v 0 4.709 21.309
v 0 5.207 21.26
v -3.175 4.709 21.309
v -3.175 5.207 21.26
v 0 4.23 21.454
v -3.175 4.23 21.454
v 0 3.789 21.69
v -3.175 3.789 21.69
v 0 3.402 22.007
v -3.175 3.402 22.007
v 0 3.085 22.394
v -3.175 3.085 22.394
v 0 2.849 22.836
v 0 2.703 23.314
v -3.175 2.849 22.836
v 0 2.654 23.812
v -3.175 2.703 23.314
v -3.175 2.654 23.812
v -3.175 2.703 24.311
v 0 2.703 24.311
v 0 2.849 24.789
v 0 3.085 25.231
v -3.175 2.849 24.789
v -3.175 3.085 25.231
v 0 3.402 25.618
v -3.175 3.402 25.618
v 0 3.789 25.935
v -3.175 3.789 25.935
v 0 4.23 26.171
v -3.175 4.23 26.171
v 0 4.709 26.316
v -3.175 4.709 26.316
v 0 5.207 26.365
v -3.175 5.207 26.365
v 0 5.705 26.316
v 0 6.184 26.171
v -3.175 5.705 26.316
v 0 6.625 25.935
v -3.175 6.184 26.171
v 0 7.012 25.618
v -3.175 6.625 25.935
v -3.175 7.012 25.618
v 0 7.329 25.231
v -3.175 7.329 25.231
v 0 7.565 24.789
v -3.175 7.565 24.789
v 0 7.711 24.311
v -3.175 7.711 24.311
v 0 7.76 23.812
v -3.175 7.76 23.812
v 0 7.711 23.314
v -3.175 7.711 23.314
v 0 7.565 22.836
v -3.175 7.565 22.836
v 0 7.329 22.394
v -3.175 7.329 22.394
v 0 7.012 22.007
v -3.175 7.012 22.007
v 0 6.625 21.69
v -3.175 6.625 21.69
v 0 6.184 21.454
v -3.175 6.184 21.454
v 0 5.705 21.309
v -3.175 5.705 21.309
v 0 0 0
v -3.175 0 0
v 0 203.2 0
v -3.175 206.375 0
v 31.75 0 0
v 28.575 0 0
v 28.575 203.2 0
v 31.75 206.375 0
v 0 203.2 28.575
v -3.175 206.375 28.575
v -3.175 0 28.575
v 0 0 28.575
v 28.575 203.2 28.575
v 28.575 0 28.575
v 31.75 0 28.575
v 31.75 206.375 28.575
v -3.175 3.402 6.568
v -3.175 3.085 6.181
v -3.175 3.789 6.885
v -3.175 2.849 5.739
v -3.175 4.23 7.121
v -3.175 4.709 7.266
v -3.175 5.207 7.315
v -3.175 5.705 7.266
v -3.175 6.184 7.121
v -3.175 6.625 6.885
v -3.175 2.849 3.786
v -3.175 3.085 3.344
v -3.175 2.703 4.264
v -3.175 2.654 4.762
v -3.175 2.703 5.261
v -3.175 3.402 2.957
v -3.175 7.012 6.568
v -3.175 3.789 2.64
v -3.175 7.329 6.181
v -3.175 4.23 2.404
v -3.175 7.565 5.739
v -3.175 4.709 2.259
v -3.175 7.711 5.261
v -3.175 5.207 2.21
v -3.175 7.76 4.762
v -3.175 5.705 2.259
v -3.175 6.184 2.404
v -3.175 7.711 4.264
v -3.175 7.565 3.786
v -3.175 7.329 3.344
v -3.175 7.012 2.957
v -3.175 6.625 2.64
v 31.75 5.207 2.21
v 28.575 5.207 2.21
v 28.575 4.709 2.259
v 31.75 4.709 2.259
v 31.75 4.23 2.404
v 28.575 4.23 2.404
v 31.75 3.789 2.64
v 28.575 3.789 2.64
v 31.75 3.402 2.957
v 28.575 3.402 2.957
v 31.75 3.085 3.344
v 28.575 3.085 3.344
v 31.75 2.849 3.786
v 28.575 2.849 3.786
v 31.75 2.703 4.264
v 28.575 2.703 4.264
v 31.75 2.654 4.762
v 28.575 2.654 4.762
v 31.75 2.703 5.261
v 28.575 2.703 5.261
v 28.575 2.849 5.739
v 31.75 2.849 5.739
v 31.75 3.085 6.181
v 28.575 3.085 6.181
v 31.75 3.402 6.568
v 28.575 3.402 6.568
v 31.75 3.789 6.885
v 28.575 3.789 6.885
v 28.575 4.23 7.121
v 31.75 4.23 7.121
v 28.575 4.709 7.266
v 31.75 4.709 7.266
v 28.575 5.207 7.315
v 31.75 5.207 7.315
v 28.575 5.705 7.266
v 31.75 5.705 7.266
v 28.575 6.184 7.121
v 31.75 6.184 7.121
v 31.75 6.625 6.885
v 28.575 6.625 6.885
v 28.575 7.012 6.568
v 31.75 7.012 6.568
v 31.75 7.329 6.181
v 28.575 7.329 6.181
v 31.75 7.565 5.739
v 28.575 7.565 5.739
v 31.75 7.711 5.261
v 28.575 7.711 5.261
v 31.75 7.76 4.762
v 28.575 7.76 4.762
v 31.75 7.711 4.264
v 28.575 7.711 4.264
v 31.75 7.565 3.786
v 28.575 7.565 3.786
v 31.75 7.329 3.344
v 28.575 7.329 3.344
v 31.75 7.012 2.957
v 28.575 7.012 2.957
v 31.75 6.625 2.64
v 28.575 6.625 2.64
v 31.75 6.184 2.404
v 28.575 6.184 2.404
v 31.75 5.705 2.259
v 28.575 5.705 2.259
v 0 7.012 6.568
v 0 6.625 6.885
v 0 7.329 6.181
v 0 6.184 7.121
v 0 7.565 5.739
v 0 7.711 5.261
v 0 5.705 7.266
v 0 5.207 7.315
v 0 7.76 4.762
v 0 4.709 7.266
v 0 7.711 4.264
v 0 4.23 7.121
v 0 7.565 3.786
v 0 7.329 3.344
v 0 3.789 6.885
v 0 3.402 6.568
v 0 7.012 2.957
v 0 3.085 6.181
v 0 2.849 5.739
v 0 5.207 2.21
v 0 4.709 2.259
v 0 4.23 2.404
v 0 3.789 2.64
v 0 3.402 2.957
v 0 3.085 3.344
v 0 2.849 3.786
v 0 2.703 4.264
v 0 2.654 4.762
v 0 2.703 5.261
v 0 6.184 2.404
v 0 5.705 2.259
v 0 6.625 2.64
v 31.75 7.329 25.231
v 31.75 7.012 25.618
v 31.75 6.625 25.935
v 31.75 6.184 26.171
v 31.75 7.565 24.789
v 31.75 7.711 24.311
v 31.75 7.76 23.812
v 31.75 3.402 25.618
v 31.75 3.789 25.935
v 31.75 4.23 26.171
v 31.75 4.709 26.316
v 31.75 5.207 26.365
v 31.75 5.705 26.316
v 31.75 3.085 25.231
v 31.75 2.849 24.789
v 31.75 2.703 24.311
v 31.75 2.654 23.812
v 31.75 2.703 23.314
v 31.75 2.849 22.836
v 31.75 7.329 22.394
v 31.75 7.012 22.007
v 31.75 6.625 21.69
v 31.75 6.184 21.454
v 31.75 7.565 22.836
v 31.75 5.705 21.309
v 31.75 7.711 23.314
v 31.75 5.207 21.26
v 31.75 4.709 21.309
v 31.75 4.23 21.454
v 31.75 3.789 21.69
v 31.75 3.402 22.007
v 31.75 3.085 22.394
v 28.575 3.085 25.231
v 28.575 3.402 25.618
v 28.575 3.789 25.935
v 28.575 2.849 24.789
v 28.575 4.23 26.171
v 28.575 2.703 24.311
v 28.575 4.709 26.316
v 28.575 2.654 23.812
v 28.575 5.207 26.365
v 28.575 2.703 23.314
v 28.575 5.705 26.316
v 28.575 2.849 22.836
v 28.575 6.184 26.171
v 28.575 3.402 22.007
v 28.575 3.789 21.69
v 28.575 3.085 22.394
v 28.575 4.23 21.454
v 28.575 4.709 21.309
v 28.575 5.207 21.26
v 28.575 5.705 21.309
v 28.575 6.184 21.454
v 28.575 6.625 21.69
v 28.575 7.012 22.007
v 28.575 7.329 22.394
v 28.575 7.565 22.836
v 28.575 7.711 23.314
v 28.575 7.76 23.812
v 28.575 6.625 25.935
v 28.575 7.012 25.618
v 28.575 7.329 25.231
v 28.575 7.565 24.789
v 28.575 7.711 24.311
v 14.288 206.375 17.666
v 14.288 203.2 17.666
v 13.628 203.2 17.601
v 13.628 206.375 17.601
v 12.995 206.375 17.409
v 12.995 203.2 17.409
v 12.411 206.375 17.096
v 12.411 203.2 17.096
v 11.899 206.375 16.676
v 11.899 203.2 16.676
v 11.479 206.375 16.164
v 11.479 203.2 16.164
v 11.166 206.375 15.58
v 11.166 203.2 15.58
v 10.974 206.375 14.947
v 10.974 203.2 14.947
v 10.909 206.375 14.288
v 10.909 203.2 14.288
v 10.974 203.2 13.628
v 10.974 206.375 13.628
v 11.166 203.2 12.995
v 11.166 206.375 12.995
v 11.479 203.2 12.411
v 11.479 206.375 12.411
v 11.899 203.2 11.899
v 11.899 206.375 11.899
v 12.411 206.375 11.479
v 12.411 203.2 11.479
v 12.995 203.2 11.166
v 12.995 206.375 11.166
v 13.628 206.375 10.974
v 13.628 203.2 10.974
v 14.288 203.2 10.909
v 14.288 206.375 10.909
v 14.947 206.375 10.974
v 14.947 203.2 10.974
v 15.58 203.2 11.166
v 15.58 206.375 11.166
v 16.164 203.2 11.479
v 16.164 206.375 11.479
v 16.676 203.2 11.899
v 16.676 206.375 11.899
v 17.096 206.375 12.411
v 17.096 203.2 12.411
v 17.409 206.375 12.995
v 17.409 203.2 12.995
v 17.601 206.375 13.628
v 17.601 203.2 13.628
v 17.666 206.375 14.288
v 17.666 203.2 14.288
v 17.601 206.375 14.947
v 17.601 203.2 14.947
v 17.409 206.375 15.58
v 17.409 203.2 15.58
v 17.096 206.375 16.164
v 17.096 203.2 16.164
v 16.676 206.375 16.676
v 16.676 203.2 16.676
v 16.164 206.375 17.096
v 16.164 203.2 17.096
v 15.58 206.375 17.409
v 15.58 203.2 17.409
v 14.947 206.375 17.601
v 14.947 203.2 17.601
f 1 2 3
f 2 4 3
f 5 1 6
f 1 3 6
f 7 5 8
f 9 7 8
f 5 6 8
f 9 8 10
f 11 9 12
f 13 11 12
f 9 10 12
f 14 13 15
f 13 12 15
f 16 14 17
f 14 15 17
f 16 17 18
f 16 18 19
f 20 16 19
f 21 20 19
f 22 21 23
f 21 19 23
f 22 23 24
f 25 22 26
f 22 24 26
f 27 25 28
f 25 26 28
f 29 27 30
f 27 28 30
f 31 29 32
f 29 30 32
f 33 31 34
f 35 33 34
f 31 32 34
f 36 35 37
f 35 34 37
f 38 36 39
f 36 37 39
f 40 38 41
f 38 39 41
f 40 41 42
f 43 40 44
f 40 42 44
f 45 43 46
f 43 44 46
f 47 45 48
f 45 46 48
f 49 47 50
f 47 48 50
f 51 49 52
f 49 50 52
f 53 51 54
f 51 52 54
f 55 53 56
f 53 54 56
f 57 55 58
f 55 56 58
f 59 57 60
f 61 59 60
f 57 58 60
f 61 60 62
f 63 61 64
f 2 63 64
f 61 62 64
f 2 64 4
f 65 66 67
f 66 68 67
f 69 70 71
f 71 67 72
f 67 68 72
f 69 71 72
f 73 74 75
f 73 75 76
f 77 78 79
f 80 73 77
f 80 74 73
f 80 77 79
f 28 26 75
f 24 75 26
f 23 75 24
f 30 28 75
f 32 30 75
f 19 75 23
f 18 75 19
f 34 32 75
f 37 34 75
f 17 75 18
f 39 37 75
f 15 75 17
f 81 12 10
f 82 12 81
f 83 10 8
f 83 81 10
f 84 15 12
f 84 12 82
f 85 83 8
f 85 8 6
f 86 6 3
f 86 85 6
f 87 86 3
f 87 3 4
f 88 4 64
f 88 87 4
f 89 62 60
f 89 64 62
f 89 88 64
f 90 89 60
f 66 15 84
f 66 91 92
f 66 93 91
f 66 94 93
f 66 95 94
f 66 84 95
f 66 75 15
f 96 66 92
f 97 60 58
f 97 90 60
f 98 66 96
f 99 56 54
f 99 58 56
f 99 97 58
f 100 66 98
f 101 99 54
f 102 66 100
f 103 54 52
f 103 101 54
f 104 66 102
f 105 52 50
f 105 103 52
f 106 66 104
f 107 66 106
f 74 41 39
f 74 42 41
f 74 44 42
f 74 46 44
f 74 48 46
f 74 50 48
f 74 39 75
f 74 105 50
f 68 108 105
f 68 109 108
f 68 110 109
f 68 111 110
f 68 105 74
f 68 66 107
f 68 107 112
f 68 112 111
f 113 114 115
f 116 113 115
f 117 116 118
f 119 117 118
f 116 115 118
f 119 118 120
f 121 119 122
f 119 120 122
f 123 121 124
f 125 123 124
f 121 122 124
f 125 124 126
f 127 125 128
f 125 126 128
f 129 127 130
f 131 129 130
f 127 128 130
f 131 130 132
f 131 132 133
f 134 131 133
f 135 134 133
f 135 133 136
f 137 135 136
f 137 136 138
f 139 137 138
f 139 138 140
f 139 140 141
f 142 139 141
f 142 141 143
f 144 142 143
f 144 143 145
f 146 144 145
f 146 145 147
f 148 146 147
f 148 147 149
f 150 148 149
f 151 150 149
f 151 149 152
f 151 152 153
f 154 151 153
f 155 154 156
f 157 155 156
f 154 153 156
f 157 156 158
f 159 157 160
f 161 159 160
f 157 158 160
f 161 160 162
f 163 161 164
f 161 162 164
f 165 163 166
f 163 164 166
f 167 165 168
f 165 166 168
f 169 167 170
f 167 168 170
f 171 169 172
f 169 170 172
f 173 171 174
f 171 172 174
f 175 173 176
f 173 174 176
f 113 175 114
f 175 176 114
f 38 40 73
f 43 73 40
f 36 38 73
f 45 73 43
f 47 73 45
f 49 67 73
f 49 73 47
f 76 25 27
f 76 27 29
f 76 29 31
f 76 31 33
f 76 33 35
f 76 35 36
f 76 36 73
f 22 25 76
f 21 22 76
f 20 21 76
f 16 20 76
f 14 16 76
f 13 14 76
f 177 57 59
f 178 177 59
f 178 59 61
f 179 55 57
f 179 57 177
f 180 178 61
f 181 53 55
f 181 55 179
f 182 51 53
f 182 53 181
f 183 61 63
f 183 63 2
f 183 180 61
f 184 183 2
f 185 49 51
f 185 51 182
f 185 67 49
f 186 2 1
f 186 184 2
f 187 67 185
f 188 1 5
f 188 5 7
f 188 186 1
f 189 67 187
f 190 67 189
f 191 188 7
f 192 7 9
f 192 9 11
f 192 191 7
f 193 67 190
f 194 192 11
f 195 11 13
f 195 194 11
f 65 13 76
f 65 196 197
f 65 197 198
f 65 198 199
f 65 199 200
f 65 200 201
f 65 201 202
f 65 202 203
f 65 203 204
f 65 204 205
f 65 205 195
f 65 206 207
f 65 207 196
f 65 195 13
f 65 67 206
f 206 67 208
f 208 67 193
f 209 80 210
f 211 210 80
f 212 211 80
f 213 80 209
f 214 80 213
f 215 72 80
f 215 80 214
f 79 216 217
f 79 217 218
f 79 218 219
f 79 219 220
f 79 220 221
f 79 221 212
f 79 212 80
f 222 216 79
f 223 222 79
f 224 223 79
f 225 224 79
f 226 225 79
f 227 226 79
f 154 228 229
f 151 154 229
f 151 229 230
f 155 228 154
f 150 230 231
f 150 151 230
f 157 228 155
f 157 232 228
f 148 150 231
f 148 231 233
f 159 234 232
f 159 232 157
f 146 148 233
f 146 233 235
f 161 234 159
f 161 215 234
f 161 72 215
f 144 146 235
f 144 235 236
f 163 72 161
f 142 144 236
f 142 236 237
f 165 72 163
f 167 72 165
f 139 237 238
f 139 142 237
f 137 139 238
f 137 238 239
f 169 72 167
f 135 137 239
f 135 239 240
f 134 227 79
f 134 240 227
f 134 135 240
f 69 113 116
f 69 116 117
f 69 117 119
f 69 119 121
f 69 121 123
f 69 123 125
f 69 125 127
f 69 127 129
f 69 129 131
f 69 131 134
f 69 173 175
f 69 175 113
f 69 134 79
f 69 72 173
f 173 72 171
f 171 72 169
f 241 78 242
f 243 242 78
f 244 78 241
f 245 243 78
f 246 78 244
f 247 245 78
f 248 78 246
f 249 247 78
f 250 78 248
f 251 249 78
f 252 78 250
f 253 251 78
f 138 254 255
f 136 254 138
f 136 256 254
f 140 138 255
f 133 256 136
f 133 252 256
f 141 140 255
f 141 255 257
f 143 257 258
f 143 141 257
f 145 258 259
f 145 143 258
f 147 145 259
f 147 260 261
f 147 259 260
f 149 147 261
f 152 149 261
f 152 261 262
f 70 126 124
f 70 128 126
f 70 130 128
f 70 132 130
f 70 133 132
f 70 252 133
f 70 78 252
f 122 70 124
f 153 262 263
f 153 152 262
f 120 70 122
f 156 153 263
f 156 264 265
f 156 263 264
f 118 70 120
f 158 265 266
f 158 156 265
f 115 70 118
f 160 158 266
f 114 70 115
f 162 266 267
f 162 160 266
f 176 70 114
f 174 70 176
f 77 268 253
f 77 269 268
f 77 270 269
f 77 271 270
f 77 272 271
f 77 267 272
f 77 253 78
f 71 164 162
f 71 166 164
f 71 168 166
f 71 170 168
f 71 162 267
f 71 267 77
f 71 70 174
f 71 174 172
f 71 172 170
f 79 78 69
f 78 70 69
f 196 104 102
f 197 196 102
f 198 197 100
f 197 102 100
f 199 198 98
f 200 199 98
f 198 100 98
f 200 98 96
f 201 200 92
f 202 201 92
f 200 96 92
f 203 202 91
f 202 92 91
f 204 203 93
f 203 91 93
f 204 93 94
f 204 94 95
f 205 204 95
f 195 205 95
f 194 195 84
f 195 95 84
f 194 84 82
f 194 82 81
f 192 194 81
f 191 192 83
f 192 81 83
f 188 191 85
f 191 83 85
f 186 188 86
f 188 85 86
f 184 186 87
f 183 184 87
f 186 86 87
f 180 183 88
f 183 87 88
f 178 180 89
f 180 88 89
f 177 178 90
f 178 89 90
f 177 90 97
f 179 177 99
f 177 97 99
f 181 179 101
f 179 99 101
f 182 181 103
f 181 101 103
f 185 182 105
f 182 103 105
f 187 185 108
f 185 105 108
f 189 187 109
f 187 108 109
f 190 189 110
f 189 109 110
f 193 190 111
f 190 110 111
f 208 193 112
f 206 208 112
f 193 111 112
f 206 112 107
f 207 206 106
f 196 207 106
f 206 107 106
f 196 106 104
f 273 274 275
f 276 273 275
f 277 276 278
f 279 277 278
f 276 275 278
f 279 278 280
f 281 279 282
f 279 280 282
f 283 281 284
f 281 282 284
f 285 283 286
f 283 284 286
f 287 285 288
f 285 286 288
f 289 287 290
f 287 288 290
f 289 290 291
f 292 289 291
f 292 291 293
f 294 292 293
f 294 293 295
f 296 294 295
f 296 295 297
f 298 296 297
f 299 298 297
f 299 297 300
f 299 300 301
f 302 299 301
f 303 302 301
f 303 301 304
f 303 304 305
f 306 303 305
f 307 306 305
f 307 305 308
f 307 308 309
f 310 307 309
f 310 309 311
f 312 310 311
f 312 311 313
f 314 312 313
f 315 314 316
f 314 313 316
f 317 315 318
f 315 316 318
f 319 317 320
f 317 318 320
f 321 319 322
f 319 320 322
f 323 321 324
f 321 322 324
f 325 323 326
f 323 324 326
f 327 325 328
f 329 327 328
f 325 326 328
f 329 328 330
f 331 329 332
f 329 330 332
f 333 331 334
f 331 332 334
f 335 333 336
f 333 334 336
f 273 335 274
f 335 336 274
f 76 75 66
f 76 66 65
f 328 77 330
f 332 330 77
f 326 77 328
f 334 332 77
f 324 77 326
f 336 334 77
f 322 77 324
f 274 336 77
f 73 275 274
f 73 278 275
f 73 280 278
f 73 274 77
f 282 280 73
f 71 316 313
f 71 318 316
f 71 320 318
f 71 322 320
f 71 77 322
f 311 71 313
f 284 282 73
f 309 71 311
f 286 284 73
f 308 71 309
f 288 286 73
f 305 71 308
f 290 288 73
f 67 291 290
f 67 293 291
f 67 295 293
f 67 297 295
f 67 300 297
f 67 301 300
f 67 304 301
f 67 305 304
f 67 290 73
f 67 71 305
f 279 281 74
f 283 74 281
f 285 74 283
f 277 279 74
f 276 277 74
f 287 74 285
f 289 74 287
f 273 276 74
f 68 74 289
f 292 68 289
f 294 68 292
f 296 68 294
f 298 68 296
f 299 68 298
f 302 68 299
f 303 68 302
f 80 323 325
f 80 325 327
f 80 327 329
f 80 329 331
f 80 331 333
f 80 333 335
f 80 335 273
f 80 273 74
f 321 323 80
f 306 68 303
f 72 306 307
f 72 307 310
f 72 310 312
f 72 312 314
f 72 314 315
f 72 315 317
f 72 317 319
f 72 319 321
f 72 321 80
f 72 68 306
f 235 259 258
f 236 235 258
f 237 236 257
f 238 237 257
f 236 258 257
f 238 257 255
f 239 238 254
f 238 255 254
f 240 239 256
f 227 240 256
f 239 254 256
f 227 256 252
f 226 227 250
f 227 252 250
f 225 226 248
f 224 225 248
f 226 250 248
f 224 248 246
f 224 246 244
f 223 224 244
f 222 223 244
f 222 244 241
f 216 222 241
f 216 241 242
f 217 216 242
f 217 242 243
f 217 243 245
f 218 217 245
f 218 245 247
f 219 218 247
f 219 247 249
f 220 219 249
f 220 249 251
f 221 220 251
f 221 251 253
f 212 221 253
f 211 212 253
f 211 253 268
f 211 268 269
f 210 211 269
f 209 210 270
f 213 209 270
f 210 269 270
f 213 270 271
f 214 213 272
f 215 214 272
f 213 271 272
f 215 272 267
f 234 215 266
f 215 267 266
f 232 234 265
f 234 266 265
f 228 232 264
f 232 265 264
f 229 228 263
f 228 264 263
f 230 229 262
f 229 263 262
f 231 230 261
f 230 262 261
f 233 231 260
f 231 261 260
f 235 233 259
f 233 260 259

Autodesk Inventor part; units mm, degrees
ref_plane "YZ Plane" through (0, 0, 0) normal (1, 0, 0) x (0, 1, 0)
ref_plane "XZ Plane" through (0, 0, 0) normal (0, 1, 0) x (-1, 0, 0)
ref_plane "XY Plane" through (0, 0, 0) normal (0, 0, 1) x (1, 0, 0)
sketch "Sketch1" plane through (0, 0, 0) normal (0, 0, 1) x (1, 0, 0)
  line L0 (0, 0) -> (28.575, 0)
  line L1 (28.575, 0) -> (28.575, 203.2)
  line L2 (28.575, 203.2) -> (0, 203.2)
  line L3 (0, 203.2) -> (0, 0)
  line L4 (31.75, 206.375) -> (31.75, 0)
  line L5 (-3.175, 0) -> (-3.175, 206.375)
  line L6 (-3.175, 206.375) -> (31.75, 206.375)
  line L7 (-3.175, 0) -> (31.75, 0)
  dimension "d0" = 28.575
  dimension "d1" = 203.2
  dimension "d2" = 3.175
  dimension "d24" = 3.175
  dimension "d25" = 3.175
extrude "Extrusion1" add sketch "Sketch1" along normal blind 28.575 contours L7 L5 L6 L4 L1 L2 L3
sketch "Sketch2" plane through (31.75, 0, 0) normal (1, 0, 0) x (0, 0, -1)
  line L0 (0, 0) -> (-28.575, 0) projected
  line L1 (0, 206.375) -> (0, 0) projected
  point P0 (-23.8125, 5.207)
  point P1 (-4.7625, 5.207)
  dimension "d5" = 5.207
  dimension "d6" = 19.05
  dimension "d7" = 28.575
  dimension "d8" = 4.7625
hole "Hole1" at (31.75, 5.207, 23.8125) at (31.75, 5.207, 4.7625) direction (-1, 0, 0) diameter 5.1054 end through all clearance for "Flat Head Machine Screw (82)" size "#10" standard "Ansi Unified Screw Threads"
sketch "Sketch3" plane through (-3.175, 206.375, 0) normal (0, 1, 0) x (1, 0, 0)
  line L0 (3.175, 0) -> (3.175, -28.575) projected
  line L1 (31.75, 0) -> (31.75, -28.575) projected
  point P0 (17.4625, -14.2875)
  point P1 (3.175, -14.2875)
  dimension "d16" = 14.2875
hole "Hole2" at (14.2875, 206.375, 14.2875) direction (0, -1, 0) diameter 6.7564 end through all clearance for "Flat Head Machine Screw (82)" size "1/4" standard "Ansi Unified Screw Threads"
equation "\"d8\" = -0.5 * d6 + 0.5 * d7"
